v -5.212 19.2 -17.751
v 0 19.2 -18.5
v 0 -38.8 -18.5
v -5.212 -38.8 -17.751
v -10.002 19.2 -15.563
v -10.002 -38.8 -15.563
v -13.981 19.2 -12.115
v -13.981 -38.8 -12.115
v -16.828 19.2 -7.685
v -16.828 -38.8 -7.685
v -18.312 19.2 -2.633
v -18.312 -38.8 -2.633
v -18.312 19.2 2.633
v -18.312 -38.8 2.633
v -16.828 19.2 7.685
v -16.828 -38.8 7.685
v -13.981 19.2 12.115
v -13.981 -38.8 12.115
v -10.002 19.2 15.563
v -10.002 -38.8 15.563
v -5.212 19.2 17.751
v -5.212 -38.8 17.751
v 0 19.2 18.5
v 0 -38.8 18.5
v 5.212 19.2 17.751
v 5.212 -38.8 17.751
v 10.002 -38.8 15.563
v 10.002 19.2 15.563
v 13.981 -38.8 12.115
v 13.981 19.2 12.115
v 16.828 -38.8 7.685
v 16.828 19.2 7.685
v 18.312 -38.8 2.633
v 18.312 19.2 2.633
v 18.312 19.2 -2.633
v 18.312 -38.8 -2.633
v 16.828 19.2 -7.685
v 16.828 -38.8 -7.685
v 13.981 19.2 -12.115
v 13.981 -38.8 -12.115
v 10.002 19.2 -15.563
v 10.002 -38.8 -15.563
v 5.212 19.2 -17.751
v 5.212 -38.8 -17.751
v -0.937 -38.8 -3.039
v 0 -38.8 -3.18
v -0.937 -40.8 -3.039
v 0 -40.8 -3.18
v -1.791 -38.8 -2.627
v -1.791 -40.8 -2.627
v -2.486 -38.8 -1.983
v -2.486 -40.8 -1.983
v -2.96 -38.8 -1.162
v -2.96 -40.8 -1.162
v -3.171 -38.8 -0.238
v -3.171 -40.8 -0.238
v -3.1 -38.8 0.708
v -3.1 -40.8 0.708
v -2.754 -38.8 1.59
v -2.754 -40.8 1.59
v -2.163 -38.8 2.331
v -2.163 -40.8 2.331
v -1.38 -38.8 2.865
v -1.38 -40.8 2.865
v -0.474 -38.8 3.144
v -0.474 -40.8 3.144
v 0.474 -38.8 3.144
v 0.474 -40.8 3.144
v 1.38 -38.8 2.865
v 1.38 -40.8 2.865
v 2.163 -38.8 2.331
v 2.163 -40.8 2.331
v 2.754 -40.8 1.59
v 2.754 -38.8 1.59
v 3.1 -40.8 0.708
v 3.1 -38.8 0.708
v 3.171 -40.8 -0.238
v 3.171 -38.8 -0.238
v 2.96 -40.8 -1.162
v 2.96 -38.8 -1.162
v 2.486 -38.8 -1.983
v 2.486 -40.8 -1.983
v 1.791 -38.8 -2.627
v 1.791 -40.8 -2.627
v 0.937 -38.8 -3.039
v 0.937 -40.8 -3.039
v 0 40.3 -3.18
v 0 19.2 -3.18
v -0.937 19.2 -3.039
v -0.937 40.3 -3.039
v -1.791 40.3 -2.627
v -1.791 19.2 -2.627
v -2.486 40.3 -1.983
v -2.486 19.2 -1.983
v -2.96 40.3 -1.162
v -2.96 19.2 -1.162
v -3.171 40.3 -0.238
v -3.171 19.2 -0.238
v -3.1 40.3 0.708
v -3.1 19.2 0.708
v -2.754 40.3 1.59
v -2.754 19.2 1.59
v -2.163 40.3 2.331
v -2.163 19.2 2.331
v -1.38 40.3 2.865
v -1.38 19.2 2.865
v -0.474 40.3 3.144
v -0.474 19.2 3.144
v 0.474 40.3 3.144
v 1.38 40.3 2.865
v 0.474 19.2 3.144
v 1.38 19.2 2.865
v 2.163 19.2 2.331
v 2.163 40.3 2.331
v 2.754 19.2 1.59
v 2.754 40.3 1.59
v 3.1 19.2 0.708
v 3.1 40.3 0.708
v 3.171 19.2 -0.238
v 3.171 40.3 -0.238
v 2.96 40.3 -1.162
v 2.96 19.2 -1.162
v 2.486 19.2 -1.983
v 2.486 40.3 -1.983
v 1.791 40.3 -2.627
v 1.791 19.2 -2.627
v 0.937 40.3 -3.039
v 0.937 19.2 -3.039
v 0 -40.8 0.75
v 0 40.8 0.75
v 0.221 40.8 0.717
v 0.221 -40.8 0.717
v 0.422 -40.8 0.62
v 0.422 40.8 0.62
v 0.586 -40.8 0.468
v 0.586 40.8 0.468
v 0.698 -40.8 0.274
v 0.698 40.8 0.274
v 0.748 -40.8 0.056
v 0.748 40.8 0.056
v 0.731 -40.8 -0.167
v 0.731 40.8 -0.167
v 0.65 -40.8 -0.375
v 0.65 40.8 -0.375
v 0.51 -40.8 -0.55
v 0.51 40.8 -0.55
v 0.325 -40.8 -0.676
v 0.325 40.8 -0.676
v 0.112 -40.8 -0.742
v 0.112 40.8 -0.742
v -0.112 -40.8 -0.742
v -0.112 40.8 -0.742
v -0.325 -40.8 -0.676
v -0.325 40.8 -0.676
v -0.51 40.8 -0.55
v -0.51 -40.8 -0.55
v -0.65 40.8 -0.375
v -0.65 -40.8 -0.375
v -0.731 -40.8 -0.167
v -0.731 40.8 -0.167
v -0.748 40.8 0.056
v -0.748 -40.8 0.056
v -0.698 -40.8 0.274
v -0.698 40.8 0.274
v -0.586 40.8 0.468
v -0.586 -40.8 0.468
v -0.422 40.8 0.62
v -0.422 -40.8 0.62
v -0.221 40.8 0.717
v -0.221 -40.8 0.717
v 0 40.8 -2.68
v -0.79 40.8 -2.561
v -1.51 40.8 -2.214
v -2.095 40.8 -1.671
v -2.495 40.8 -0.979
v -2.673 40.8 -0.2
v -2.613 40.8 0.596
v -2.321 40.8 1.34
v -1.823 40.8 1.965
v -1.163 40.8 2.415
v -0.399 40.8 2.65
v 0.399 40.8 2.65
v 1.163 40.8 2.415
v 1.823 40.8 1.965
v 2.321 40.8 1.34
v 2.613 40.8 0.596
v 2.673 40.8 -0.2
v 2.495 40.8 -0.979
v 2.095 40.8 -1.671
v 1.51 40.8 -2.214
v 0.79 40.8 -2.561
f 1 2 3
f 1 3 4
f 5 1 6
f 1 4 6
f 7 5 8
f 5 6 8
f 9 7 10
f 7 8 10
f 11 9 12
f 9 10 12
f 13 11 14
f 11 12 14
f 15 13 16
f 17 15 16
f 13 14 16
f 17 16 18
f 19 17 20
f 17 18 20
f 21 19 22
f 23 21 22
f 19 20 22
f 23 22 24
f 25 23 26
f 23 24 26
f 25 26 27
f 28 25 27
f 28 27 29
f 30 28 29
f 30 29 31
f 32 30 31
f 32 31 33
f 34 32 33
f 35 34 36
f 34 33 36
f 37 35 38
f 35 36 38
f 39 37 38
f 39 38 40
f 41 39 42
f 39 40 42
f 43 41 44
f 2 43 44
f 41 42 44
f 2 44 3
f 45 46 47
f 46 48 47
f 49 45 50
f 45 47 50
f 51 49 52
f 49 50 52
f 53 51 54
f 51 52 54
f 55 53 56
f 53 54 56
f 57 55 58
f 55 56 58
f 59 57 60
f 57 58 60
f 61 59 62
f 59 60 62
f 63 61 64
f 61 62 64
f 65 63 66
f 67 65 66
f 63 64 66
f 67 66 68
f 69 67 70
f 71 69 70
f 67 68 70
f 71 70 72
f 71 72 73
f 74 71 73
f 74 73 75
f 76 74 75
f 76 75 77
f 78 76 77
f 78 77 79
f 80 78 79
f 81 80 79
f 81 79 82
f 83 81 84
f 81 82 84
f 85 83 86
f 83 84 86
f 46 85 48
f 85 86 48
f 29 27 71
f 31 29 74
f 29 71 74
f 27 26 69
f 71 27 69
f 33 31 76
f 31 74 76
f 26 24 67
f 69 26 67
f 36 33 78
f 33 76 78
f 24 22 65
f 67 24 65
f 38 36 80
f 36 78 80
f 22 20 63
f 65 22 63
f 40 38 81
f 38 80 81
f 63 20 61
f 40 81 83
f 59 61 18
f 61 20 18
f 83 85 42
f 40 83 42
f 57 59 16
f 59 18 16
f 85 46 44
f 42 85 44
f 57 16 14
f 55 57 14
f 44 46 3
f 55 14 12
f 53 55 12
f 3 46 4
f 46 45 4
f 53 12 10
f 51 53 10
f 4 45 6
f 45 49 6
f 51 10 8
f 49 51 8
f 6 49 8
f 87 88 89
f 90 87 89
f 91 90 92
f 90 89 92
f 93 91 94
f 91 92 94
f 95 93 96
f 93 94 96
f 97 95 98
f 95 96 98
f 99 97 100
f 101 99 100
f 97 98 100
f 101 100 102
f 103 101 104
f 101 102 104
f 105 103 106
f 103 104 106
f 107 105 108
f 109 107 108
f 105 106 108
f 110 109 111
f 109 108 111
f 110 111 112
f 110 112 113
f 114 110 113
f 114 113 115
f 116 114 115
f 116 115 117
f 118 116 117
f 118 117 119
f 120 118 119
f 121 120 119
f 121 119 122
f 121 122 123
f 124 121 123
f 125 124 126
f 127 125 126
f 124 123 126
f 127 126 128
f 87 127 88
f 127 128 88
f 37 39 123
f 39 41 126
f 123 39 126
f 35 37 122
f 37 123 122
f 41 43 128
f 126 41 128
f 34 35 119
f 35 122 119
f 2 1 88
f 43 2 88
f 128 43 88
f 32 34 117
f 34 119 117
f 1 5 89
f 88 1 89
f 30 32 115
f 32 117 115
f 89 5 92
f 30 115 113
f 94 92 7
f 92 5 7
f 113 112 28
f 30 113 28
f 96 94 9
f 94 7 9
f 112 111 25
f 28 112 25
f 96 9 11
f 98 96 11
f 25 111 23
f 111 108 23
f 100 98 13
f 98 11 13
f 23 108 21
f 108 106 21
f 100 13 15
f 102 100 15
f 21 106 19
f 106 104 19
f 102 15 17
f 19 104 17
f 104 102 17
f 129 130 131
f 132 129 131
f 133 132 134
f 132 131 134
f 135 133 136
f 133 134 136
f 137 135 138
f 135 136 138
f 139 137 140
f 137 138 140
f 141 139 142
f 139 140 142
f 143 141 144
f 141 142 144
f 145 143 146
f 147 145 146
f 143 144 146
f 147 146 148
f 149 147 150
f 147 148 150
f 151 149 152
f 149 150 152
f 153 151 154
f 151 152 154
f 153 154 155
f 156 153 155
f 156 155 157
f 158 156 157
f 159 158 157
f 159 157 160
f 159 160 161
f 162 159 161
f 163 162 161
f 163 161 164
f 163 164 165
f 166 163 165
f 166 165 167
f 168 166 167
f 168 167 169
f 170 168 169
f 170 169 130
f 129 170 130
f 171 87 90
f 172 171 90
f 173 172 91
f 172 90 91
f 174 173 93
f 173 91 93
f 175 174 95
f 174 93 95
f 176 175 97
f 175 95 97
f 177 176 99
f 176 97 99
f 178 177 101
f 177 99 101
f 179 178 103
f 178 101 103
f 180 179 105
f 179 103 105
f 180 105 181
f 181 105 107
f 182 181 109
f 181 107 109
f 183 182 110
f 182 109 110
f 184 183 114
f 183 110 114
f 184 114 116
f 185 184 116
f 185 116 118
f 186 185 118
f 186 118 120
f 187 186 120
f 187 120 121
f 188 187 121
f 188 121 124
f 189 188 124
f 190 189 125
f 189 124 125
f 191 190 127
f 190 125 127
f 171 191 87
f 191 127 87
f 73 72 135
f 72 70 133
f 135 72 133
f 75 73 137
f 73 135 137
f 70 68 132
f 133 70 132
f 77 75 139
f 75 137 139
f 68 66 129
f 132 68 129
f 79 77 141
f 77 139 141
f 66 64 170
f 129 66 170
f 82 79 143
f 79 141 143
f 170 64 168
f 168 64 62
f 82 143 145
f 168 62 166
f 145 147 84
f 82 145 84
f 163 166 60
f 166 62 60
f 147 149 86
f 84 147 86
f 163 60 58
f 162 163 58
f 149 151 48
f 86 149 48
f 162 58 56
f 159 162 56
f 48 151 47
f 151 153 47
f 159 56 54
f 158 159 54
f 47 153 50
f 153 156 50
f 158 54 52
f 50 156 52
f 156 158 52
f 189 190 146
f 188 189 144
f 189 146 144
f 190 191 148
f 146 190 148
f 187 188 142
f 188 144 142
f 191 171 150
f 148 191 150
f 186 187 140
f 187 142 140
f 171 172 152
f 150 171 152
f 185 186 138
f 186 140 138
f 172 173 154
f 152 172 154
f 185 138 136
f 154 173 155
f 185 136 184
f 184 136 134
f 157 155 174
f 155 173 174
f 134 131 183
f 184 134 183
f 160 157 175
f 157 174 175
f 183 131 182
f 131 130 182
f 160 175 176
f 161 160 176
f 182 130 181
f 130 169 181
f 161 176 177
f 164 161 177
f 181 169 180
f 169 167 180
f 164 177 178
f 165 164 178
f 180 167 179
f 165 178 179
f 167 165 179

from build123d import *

# Parameters (mm, degrees)
CHAMFER1_SIZE      = 0.5
SKETCH3_R          = 0.75
CUT_EXTRUDE2_DEPTH = 86.691656537


with BuildPart() as part:
    # Sketch1 → Revolve1 (revolve)
    with BuildSketch(Plane(origin=(0, 0, 0), x_dir=(0, 0, -1), z_dir=(1, 0, 0))):
        Polygon((0, -40.8), (0, 40.8), (3.18, 40.8), (3.18, 19.2), (18.5, 19.2), (18.5, -38.8), (3.18, -38.8), (3.18, -40.8), align=None)
    revolve(axis=Axis((0, -40.8, 0), (0, 1, 0)))

    # Chamfer1
    chamfer1_edges = [part.edges().sort_by_distance(p)[0] for p in [
        (0, 40.8, 3.18),
    ]]
    chamfer(chamfer1_edges, length=CHAMFER1_SIZE)

    # Sketch3 → Cut-Extrude2 (cut, through all)
    with BuildSketch(Plane(origin=(0, 40.8, 0), x_dir=(1, 0, 0), z_dir=(0, 1, 0))):
        with Locations(Location((0, 0, 0), (0, 0, 270))):
            Circle(SKETCH3_R)
    extrude(amount=-CUT_EXTRUDE2_DEPTH, mode=Mode.SUBTRACT)


solid = part.part
